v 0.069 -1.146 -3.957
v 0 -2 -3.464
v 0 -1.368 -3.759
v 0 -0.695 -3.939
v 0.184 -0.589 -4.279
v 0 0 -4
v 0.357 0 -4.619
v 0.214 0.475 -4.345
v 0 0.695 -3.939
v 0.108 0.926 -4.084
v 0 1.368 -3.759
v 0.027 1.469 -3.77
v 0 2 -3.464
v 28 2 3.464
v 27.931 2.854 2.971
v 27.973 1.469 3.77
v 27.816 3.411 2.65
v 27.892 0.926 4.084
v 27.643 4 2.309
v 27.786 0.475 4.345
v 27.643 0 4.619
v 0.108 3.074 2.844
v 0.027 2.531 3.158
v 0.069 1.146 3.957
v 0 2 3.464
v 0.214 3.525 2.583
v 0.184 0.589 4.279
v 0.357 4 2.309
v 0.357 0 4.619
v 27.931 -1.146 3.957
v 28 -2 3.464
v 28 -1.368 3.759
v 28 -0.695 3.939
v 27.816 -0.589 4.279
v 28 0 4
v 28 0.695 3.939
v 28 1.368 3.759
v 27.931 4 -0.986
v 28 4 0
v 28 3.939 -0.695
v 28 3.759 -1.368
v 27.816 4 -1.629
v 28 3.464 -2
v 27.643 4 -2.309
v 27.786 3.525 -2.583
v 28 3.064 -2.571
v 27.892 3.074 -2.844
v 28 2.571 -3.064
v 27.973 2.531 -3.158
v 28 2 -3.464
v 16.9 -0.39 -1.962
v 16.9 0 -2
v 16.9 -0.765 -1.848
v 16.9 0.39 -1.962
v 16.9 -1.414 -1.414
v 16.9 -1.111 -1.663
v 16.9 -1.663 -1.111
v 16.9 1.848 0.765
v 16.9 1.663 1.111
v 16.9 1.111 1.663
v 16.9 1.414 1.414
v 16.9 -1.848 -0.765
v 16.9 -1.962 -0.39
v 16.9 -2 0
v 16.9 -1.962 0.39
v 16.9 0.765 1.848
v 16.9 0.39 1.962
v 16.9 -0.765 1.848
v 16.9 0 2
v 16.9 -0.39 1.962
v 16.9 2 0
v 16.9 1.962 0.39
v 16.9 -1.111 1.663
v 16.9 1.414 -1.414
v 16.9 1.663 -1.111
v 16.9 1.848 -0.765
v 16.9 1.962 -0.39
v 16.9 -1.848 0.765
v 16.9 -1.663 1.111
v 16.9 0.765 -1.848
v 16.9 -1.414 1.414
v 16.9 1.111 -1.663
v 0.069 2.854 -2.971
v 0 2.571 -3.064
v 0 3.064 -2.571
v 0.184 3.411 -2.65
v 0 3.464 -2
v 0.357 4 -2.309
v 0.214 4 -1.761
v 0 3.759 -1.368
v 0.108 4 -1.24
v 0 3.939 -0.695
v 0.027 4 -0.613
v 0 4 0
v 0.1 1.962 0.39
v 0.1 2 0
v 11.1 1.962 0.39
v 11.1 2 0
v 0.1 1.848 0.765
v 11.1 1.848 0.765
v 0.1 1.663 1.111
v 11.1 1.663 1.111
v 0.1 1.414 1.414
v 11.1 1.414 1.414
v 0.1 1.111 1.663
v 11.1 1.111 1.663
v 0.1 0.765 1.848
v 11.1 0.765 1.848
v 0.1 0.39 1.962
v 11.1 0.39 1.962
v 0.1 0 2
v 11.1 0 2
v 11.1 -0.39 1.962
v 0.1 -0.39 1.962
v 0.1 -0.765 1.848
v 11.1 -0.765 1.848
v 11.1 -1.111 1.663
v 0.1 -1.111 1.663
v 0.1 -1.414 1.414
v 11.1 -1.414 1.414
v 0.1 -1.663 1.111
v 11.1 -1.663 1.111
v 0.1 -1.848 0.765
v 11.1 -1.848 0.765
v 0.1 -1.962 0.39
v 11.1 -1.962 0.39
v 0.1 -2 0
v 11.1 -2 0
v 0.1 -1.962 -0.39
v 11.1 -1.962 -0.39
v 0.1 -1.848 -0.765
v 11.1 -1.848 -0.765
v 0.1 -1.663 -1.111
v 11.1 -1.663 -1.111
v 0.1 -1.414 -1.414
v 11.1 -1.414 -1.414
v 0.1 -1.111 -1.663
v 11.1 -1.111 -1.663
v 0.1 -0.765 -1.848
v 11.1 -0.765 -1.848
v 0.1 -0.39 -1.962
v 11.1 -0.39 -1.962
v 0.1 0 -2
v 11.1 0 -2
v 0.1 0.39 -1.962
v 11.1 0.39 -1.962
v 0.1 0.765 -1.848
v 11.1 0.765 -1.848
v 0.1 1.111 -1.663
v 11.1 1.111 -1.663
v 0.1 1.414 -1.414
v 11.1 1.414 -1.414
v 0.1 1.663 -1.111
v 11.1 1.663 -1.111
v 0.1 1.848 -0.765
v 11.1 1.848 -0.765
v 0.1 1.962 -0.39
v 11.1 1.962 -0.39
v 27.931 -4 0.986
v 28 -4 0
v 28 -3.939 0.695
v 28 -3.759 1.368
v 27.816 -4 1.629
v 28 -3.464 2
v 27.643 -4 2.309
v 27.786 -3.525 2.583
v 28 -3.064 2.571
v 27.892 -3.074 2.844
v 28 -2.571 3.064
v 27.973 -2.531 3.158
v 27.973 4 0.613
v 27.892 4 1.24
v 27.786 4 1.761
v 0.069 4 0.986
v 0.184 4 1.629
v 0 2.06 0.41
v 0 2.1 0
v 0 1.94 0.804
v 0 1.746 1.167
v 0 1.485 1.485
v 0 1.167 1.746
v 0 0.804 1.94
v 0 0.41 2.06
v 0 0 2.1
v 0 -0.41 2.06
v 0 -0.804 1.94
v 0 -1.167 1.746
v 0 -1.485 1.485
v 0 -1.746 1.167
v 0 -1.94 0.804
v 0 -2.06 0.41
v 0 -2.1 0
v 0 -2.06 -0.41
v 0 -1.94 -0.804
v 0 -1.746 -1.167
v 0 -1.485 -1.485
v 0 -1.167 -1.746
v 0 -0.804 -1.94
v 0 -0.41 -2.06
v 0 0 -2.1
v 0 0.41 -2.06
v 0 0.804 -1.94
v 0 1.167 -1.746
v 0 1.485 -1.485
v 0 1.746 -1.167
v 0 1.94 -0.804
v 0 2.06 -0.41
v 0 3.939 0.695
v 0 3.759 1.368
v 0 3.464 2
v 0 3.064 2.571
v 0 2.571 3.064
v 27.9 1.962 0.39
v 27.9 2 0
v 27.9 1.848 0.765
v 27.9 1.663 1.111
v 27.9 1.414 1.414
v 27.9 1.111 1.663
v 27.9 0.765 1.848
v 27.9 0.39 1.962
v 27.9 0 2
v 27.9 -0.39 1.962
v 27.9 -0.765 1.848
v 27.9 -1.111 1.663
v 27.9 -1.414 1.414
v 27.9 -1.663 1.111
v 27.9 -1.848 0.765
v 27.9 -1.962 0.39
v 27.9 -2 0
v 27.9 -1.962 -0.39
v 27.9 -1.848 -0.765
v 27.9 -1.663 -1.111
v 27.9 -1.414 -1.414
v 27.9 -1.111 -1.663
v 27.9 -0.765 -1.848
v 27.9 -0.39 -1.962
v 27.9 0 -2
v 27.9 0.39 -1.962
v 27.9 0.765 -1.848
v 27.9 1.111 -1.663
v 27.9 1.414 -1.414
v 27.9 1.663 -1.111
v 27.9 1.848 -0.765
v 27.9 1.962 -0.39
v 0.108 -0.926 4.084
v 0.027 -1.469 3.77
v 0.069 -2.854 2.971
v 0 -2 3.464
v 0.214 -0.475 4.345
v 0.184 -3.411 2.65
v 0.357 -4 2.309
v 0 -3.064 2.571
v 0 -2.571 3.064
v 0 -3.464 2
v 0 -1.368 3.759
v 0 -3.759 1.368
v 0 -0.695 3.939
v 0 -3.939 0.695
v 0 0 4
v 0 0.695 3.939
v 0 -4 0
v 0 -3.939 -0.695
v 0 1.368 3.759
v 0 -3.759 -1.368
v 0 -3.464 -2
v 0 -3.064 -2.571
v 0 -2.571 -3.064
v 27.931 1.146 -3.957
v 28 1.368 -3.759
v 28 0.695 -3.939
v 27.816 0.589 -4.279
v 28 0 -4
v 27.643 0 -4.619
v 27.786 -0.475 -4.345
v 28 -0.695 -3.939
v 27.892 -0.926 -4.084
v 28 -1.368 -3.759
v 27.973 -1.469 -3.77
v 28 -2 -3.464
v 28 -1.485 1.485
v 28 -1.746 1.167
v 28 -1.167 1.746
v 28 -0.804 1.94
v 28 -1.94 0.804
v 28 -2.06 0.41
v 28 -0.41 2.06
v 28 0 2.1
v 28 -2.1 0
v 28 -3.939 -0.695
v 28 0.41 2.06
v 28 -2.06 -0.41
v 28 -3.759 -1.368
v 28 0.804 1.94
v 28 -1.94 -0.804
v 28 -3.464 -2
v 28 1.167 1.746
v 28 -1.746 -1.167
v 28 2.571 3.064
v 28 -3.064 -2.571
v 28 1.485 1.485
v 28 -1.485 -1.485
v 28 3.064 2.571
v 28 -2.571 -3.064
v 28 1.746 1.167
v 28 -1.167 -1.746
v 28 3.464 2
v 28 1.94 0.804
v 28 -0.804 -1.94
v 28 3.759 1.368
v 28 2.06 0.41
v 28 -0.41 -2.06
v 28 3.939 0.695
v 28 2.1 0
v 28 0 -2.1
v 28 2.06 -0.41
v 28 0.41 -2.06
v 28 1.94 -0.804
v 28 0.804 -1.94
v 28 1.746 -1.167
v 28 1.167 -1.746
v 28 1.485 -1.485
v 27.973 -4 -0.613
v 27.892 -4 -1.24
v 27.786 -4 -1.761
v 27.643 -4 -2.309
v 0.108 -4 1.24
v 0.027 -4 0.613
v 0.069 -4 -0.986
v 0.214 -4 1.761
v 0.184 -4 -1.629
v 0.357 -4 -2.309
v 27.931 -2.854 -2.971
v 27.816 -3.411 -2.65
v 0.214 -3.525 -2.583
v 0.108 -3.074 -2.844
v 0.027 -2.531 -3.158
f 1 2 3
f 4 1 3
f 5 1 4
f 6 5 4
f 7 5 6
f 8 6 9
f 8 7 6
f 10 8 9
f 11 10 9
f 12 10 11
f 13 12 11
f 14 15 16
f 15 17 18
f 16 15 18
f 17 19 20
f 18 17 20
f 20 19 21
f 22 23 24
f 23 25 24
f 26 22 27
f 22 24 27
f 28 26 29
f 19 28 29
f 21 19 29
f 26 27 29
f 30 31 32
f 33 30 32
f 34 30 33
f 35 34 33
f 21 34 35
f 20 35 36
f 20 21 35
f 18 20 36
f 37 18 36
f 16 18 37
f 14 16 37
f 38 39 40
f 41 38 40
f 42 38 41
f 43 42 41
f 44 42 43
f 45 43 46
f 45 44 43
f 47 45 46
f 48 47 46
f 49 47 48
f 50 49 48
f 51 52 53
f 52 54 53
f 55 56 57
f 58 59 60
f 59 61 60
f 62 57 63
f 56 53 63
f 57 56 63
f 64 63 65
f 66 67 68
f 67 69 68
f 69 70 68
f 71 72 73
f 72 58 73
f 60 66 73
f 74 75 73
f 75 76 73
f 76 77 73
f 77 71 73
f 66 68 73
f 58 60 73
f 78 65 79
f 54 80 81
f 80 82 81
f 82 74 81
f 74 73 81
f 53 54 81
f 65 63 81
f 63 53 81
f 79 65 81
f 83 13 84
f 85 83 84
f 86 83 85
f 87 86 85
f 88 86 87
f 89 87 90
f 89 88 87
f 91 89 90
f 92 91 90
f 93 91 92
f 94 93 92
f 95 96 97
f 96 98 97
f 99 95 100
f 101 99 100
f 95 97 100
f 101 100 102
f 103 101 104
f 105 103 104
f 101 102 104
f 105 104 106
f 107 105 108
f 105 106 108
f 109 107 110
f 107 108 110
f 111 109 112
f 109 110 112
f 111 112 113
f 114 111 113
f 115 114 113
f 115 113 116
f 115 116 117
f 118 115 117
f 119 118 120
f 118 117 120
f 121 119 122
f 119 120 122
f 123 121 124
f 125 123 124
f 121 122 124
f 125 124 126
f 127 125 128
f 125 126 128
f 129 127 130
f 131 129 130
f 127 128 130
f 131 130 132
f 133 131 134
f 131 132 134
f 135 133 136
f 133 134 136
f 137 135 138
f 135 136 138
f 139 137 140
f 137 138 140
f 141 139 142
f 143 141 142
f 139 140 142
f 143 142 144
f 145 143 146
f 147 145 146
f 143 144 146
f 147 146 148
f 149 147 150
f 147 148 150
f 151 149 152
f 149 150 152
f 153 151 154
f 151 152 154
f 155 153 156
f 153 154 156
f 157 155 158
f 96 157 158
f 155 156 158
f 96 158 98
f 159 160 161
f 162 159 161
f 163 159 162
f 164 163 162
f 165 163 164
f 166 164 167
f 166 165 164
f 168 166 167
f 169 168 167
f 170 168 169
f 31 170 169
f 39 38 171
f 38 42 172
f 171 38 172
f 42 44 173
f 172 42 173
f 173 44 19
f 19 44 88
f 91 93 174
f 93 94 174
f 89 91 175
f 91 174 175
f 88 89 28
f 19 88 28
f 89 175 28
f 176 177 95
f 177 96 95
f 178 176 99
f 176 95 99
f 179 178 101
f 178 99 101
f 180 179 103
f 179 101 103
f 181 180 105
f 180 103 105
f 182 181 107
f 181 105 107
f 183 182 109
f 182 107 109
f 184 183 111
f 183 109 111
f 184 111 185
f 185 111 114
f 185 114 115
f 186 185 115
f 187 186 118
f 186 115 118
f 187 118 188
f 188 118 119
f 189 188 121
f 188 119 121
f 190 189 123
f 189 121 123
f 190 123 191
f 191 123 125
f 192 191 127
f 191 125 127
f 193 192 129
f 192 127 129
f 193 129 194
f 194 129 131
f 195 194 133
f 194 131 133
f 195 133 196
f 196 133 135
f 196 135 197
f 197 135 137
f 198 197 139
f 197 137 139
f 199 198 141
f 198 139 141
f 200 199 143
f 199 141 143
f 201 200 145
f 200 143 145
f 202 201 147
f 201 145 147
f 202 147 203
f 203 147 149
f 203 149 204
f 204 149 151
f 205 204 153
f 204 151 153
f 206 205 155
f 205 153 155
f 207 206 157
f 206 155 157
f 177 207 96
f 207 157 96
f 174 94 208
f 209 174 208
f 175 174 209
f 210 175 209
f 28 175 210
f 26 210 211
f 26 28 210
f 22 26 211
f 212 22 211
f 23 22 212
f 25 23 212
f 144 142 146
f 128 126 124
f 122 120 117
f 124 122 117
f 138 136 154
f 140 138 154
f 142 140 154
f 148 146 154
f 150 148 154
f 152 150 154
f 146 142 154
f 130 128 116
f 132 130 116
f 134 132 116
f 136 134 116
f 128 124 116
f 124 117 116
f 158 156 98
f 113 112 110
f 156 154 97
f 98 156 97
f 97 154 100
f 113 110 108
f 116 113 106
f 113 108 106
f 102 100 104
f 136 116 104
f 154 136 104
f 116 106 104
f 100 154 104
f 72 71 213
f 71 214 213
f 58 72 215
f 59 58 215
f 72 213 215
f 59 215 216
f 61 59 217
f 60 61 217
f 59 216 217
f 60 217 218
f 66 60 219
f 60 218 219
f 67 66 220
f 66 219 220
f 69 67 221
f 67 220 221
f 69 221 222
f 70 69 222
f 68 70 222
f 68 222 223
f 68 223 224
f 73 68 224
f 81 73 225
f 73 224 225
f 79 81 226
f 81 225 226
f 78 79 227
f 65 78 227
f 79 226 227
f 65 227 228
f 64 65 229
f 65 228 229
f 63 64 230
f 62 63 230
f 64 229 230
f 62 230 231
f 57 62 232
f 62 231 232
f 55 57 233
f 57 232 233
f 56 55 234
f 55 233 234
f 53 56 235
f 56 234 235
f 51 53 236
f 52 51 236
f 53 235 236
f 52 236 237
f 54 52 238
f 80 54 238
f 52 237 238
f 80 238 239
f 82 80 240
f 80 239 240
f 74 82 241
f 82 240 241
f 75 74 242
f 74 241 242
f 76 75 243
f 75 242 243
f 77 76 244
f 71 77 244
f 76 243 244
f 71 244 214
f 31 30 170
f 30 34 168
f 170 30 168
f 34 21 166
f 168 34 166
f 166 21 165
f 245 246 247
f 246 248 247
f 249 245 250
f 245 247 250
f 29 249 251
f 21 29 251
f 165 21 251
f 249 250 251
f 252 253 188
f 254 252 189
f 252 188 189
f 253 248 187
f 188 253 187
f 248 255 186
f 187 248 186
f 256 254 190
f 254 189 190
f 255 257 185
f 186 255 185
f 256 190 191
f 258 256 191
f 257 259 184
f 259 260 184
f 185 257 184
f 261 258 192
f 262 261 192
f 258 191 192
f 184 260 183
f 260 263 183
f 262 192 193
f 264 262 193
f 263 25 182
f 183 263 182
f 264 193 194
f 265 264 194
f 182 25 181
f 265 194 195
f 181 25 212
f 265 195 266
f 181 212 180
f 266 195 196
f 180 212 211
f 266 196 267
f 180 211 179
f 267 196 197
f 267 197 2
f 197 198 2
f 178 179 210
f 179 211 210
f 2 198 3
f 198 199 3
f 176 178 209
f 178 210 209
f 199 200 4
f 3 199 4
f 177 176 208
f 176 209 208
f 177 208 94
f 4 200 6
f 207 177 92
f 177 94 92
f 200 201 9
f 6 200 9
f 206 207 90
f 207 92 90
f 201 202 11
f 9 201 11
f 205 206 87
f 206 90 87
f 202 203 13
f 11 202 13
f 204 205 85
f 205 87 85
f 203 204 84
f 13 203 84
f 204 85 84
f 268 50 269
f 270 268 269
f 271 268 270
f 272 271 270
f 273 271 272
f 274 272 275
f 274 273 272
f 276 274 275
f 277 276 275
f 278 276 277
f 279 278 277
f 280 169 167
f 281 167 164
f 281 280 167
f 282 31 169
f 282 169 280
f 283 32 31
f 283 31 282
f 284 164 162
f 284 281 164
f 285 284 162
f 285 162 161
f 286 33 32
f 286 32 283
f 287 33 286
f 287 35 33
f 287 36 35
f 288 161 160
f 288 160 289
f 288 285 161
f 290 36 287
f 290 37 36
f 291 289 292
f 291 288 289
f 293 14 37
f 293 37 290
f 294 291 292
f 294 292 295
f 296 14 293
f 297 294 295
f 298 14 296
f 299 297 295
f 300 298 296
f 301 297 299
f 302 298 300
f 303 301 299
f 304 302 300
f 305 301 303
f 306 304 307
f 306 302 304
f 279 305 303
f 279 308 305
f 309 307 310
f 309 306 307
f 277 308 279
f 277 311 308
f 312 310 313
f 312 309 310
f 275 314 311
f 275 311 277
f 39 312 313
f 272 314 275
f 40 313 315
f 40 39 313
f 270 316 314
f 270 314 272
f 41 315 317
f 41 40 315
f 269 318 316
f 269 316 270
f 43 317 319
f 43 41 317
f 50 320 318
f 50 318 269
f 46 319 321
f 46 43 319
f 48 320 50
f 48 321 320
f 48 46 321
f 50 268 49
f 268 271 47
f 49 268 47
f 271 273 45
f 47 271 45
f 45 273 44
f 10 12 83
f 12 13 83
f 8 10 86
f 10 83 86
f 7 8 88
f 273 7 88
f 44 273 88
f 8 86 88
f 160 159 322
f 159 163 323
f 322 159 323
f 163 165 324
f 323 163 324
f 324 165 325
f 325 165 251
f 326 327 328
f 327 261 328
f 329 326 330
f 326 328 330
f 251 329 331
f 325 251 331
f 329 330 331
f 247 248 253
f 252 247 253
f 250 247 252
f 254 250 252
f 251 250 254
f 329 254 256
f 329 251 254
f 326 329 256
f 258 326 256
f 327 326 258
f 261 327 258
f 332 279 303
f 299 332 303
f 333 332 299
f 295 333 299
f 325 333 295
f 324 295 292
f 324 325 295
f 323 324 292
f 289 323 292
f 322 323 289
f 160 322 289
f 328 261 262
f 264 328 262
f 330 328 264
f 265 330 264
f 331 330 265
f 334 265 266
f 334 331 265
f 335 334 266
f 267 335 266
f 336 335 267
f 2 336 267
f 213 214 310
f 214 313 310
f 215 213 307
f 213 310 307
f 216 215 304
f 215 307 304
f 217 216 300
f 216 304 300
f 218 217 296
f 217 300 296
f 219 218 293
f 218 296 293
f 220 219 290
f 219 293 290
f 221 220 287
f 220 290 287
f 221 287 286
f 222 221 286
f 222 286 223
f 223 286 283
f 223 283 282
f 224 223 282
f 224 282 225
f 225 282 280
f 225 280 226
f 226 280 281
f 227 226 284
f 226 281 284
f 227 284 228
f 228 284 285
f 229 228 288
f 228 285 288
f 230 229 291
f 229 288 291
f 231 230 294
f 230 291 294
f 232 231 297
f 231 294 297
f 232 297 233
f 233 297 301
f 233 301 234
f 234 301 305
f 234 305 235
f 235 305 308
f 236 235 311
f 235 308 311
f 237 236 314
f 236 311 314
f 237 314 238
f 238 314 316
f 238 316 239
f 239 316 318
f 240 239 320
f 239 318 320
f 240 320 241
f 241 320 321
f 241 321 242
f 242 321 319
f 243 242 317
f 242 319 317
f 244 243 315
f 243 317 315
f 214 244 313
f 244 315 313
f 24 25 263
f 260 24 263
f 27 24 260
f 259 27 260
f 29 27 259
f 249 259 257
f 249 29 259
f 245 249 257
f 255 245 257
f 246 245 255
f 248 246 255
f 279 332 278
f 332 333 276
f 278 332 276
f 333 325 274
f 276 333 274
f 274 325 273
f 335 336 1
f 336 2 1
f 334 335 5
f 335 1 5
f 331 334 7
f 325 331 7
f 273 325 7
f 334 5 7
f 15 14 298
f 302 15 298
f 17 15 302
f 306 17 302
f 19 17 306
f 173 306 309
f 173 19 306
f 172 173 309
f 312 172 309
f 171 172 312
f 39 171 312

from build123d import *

# Parameters (mm, degrees)
BOSS_EXTRUDE1_DEPTH = 28
SKETCH4_OUTSIDE_W   = 117.808
SKETCH4_OUTSIDE_H   = 116.57
SKETCH4_OUTSIDE_R   = 4
CUT_EXTRUDE1_DEPTH  = 29
CUT_EXTRUDE1_TAPER  = 60
SKETCH5_OUTSIDE_W   = 117.808
SKETCH5_OUTSIDE_H   = 116.57
SKETCH5_OUTSIDE_R   = 4
CUT_EXTRUDE2_DEPTH  = 29
CUT_EXTRUDE2_TAPER  = 60


with BuildPart() as part:
    # Sketch2 → Boss-Extrude1 (new body)
    with BuildSketch(Plane(origin=(0, 0, 0), x_dir=(0, 0, -1), z_dir=(1, 0, 0))):
        Polygon((2.309401077, 4), (-2.309401077, 4), (-4.618802154, 0), (-2.309401077, -4), (2.309401077, -4), (4.618802154, 0), align=None)
    extrude(amount=BOSS_EXTRUDE1_DEPTH)

    # Sketch3 → Cut-Revolve1 (revolve, cut)
    with BuildSketch(Plane.XY):
        Polygon((0, 2.1), (0.1, 2), (11.1, 2), (11.1, 0), (0, 0), align=None)
        Polygon((28, 0), (16.9, 0), (16.9, 2), (27.9, 2), (28, 2.1), align=None)
    revolve(axis=Axis((0, 0, 0), (1, 0, 0)), mode=Mode.SUBTRACT)

    # Sketch4 outside → Cut-Extrude1 (cut, through all)
    with BuildSketch(Plane.ZY):
        Rectangle(SKETCH4_OUTSIDE_W, SKETCH4_OUTSIDE_H)
        Circle(SKETCH4_OUTSIDE_R, mode=Mode.SUBTRACT)
    extrude(amount=-CUT_EXTRUDE1_DEPTH, taper=CUT_EXTRUDE1_TAPER, mode=Mode.SUBTRACT)

    # Sketch5 outside → Cut-Extrude2 (cut, through all)
    with BuildSketch(Plane(origin=(28, 0, 0), x_dir=(0, 0, -1), z_dir=(1, 0, 0))):
        Rectangle(SKETCH5_OUTSIDE_W, SKETCH5_OUTSIDE_H)
        Circle(SKETCH5_OUTSIDE_R, mode=Mode.SUBTRACT)
    extrude(amount=-CUT_EXTRUDE2_DEPTH, taper=CUT_EXTRUDE2_TAPER, mode=Mode.SUBTRACT)


solid = part.part
